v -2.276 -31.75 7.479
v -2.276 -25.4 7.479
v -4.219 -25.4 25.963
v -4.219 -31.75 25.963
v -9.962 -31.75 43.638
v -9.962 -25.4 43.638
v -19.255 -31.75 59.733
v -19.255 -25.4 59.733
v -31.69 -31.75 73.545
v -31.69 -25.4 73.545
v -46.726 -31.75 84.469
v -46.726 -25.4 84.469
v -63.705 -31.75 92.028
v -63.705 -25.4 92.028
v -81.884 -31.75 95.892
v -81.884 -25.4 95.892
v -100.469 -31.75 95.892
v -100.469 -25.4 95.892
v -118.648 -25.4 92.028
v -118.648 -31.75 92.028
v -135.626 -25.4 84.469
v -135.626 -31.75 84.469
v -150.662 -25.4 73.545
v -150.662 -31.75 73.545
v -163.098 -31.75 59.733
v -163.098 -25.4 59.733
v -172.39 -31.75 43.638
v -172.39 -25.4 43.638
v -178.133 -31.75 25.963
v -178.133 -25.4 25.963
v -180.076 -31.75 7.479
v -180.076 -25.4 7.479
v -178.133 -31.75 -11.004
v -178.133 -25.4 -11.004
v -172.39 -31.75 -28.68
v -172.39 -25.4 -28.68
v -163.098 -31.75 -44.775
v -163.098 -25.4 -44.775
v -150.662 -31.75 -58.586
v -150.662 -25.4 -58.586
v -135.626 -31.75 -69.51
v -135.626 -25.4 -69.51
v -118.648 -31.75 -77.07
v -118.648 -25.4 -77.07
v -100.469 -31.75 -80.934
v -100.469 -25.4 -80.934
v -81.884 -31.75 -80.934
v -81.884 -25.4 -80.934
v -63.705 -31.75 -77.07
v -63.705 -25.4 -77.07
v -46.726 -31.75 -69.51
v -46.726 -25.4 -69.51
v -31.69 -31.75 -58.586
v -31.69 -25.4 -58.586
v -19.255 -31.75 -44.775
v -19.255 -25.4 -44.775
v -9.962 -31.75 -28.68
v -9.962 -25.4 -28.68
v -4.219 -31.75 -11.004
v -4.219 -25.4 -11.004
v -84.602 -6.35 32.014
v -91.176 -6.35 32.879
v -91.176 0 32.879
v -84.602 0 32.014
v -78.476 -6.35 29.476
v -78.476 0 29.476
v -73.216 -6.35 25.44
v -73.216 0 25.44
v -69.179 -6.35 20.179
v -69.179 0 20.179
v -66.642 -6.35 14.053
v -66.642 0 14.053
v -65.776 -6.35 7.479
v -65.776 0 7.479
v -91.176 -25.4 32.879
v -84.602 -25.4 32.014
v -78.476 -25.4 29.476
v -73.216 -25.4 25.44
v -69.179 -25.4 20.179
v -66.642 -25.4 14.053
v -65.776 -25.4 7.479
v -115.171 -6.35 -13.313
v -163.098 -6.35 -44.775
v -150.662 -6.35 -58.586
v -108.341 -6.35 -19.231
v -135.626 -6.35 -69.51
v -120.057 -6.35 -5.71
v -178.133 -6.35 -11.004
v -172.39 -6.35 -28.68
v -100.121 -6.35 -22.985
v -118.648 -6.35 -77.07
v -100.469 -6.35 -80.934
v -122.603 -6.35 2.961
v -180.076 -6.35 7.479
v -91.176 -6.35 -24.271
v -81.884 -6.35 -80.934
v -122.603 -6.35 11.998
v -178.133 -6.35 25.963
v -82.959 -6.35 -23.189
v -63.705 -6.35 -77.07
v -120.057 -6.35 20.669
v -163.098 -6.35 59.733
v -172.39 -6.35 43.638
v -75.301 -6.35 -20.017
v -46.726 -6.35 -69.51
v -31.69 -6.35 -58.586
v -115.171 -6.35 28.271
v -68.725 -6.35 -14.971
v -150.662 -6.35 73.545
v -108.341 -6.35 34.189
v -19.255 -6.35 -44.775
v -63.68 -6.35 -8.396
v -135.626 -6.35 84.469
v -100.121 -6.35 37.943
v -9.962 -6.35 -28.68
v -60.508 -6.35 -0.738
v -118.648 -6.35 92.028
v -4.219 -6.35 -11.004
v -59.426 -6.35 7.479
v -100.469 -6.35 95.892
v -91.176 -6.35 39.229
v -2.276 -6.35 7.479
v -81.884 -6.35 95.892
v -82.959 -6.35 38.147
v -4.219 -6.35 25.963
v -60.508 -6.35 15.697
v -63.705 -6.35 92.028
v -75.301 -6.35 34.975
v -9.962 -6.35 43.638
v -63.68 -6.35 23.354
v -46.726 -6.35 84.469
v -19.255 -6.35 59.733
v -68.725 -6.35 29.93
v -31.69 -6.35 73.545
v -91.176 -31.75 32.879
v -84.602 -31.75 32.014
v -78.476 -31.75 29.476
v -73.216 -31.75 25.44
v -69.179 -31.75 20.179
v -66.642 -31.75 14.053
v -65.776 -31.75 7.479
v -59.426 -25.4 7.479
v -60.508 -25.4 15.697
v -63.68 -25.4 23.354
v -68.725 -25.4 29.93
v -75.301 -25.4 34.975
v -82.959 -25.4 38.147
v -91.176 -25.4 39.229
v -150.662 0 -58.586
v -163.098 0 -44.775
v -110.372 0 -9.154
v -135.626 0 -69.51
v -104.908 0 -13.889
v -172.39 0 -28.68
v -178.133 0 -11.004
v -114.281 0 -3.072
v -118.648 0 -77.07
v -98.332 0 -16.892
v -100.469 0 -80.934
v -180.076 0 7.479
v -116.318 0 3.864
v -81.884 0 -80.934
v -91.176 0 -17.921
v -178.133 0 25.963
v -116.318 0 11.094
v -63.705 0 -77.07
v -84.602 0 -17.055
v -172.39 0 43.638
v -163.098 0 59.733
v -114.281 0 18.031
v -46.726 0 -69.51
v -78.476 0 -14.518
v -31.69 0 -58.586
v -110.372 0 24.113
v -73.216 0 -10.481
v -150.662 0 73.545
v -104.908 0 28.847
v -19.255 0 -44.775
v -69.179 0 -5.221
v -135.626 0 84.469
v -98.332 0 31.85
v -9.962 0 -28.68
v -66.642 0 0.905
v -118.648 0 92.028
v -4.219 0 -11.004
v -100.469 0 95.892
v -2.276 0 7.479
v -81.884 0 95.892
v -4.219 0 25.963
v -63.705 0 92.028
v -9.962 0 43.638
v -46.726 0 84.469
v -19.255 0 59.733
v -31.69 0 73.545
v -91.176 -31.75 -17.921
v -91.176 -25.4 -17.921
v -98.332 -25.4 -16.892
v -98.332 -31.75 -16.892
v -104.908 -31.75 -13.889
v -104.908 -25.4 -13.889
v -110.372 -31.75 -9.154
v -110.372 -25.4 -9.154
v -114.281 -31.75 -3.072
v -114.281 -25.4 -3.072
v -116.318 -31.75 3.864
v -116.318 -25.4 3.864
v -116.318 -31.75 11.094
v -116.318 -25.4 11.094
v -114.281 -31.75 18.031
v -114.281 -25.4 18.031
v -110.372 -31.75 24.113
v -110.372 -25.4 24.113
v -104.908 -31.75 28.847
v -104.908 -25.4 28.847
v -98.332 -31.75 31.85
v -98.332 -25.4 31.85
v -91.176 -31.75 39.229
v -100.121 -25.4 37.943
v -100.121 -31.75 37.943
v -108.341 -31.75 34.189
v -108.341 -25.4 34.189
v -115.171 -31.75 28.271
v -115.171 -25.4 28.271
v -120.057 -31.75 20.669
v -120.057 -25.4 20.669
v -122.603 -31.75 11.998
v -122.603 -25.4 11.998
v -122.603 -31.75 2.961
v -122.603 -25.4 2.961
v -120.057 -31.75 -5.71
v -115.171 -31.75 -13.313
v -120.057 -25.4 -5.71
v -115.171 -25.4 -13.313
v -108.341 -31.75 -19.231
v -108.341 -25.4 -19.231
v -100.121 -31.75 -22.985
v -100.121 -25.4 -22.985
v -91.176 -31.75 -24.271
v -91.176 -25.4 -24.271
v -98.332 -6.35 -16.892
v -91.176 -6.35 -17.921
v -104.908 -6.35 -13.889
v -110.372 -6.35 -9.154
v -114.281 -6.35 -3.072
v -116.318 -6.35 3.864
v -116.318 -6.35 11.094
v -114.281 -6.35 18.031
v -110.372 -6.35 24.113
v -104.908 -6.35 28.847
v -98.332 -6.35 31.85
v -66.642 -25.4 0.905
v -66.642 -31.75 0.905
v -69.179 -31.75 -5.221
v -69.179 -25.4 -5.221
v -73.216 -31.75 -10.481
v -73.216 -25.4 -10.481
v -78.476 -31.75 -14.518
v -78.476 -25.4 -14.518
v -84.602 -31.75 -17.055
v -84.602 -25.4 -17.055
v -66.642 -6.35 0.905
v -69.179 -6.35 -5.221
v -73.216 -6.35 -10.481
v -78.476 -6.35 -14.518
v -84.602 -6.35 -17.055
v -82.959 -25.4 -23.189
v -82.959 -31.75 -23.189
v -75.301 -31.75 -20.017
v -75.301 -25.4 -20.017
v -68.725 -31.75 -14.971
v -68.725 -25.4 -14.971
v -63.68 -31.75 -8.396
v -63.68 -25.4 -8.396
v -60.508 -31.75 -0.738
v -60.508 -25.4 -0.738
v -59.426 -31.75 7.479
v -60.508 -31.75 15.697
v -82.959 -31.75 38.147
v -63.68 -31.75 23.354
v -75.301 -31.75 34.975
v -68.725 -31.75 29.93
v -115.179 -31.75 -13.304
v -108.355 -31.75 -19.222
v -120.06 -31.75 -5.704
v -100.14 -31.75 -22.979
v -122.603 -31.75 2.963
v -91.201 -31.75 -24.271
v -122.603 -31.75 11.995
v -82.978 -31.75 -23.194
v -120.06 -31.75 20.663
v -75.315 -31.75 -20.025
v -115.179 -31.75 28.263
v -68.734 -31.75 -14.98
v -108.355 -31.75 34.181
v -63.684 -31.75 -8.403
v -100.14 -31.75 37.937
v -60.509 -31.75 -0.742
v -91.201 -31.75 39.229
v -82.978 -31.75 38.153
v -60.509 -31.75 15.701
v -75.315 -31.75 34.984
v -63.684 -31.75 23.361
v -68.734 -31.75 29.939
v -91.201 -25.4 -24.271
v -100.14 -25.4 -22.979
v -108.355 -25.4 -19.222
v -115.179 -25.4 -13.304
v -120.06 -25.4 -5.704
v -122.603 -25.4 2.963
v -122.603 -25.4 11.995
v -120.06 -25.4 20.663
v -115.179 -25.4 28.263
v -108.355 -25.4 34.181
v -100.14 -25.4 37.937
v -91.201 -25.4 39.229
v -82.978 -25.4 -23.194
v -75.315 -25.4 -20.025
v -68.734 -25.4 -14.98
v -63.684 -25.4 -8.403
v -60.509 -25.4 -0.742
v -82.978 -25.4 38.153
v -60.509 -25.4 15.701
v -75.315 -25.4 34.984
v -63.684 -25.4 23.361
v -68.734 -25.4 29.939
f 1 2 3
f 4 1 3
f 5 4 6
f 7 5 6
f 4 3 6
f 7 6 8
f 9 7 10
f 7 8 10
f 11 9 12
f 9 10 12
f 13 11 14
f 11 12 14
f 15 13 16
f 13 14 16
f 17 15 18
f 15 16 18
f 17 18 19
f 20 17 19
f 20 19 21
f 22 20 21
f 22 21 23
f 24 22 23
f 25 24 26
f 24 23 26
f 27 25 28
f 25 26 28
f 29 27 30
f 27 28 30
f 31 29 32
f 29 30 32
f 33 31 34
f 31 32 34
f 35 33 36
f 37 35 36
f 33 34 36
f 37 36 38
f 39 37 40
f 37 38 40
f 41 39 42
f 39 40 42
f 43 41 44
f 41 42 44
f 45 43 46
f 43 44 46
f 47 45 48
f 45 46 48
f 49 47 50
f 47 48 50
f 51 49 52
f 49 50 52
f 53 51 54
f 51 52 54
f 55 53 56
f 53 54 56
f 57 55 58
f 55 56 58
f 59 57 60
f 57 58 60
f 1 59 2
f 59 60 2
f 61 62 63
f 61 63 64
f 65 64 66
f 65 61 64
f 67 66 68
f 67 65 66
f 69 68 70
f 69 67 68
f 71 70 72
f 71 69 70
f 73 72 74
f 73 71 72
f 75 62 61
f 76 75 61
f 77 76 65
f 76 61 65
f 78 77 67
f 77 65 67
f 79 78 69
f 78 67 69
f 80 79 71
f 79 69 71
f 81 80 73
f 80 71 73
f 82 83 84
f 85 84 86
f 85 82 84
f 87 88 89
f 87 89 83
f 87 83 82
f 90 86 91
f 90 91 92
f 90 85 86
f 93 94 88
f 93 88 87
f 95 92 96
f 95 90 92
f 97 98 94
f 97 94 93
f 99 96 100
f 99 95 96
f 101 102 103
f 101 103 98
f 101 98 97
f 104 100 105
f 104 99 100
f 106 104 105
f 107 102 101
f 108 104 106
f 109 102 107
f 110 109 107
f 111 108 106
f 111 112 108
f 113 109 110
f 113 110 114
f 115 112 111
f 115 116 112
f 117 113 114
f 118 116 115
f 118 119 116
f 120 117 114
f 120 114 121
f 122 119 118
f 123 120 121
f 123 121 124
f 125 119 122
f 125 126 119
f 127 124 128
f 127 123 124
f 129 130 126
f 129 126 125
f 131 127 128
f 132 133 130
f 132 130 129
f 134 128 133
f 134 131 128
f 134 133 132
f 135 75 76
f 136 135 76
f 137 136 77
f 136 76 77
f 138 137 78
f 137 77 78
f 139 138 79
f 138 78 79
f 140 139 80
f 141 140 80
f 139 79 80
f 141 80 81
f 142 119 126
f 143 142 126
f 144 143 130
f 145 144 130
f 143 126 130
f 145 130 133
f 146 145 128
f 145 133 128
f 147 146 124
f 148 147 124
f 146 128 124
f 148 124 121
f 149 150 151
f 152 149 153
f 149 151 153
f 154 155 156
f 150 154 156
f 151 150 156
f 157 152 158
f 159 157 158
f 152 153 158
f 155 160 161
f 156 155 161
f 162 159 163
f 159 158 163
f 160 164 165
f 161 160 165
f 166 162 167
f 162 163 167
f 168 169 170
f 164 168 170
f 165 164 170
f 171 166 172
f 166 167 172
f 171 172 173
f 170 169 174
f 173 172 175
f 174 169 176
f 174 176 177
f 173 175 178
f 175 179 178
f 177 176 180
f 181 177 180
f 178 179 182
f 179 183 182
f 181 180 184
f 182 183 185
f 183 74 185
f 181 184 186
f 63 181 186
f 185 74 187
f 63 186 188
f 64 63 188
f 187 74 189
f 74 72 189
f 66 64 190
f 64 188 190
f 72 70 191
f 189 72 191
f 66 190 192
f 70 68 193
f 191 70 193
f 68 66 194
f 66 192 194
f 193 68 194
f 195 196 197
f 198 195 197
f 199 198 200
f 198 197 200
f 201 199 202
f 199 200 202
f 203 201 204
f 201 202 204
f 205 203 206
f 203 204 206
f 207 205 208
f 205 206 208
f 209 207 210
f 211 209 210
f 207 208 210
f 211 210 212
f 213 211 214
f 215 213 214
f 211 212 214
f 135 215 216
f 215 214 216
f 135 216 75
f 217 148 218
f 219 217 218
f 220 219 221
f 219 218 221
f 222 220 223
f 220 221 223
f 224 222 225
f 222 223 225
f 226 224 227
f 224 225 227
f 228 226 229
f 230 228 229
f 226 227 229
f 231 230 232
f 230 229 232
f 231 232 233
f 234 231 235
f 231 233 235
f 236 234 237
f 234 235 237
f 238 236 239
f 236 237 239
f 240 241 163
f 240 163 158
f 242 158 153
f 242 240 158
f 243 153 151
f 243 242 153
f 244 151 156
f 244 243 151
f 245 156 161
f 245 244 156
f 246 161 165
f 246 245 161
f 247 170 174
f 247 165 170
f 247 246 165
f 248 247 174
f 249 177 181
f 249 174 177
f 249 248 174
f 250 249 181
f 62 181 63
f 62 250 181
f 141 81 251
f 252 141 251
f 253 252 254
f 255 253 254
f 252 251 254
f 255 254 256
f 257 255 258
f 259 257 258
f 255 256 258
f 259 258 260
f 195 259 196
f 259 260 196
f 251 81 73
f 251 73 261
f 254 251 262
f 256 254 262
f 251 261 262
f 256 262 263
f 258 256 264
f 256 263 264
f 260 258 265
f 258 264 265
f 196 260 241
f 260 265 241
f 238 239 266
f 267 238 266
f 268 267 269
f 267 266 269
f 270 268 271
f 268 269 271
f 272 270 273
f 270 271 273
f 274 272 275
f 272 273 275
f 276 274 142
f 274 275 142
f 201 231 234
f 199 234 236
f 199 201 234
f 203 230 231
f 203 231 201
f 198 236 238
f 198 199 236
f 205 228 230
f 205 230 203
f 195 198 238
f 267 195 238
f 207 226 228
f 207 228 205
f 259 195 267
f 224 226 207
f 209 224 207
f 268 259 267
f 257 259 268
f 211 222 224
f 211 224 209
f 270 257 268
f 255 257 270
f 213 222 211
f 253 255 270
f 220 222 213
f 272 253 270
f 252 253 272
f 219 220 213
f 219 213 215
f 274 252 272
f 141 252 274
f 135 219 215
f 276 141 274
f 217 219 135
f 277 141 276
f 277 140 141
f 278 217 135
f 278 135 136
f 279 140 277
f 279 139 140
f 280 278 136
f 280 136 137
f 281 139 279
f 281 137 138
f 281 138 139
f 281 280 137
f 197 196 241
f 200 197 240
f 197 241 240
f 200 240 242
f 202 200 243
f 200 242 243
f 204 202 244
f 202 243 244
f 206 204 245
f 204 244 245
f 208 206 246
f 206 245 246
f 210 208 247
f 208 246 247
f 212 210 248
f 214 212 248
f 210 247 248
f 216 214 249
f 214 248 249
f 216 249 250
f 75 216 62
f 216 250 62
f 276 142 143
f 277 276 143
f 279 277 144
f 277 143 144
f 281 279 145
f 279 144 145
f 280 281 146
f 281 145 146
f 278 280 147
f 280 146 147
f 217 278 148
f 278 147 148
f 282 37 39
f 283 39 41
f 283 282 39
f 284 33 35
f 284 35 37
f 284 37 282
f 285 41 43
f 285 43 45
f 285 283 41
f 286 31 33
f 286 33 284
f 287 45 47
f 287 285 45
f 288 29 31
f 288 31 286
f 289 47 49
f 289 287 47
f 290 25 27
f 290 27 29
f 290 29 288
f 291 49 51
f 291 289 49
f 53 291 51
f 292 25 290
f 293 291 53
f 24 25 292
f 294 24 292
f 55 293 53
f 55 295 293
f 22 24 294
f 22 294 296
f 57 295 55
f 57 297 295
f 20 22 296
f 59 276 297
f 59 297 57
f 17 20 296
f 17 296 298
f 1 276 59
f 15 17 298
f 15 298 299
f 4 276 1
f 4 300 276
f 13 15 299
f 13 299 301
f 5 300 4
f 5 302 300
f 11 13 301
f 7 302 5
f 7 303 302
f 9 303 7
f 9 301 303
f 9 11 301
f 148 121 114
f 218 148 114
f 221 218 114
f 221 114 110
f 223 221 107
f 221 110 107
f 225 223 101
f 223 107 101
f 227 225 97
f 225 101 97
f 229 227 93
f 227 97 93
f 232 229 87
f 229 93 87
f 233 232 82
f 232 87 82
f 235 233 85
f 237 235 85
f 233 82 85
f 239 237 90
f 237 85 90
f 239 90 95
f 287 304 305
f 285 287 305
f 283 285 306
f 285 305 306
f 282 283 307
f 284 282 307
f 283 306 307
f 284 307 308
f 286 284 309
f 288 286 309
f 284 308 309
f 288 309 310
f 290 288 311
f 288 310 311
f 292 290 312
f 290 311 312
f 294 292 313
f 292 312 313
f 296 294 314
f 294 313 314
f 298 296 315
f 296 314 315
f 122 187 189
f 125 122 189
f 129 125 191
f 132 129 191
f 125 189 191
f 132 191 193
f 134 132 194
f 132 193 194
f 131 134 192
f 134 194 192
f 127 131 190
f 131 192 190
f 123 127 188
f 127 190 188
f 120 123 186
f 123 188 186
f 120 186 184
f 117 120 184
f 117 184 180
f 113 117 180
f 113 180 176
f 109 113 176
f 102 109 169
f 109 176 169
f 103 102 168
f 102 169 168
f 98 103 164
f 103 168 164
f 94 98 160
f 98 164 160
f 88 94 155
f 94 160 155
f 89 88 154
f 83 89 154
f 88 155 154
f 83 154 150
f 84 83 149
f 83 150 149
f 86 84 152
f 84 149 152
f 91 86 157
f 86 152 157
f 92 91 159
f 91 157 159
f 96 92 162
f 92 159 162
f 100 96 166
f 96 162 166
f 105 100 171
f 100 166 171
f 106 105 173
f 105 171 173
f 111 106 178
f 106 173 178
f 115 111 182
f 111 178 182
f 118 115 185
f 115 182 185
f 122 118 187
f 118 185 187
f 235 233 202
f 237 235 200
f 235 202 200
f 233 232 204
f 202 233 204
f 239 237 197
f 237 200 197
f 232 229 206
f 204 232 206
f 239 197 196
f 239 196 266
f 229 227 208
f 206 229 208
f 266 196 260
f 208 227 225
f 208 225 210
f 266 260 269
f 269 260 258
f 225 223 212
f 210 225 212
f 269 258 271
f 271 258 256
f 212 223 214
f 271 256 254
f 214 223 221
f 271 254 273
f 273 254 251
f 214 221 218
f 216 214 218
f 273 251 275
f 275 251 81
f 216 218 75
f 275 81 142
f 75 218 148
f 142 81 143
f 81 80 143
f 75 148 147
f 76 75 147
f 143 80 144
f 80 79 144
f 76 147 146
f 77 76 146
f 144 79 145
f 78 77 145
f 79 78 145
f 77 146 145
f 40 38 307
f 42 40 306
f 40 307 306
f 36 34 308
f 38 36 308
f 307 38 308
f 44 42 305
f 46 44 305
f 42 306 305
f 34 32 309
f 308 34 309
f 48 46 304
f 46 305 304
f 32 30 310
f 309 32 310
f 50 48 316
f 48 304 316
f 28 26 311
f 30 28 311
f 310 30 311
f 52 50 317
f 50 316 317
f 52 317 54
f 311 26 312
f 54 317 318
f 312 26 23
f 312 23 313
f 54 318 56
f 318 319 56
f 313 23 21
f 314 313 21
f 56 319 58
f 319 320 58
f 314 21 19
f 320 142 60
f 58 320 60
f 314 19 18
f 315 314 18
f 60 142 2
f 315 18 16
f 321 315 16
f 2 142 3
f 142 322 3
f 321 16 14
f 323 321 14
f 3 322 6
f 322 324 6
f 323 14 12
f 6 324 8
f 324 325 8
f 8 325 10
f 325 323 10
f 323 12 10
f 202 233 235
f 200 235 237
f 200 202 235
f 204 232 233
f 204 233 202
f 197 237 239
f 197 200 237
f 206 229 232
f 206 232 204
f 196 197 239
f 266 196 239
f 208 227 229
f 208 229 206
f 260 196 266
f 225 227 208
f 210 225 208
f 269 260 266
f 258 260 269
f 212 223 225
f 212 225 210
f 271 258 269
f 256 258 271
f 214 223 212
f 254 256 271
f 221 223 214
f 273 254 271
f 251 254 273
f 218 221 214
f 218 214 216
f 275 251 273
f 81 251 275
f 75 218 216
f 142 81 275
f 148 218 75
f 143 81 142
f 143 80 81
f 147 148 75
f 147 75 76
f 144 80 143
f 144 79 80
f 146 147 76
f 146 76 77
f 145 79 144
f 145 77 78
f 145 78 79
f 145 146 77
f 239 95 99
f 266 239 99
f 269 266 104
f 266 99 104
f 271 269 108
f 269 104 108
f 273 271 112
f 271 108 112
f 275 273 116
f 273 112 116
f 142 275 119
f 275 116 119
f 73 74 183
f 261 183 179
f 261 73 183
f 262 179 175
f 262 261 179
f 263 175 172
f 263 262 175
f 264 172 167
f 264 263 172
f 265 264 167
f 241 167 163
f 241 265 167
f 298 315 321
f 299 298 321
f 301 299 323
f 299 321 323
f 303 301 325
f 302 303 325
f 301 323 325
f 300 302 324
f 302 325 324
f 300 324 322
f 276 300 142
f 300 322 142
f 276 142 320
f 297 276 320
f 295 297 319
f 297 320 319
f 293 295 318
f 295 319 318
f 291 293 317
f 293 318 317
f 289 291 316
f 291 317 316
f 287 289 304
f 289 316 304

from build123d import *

# Parameters (mm, degrees)
F0_R     = 88.9
F1_DEPTH = 6.35
F3_DEPTH = 19.05
F4_R     = 88.9
F5_DEPTH = 6.35
F6_DEPTH = 6.35
F7_DEPTH = 25.4


with BuildPart() as f1:
    # F0 (on Front) → F1 (new body)
    with BuildSketch(Plane.XZ):
        with Locations((-91.1761373281, 7.4791824445)):
            Circle(F0_R)
    extrude(amount=F1_DEPTH)

    # F2 (on face) → F3 (join)
    with BuildSketch(Plane.XZ.offset(6.35)):
        with BuildLine():
            Line((-91.1761373281, 32.8791824445), (-91.1761373281, 39.2291824445))
            ThreePointArc((-91.1761373281, 39.2291824445), (-122.9261373281, 7.4791824445), (-91.1761373281, -24.2708175555))
            Line((-91.1761373281, -24.2708175555), (-91.1761373281, -17.9208175555))
            ThreePointArc((-91.1761373281, -17.9208175555), (-116.5761373281, 7.4791824445), (-91.1761373281, 32.8791824445))
        make_face()
        with BuildLine():
            ThreePointArc((-59.4261373281, 7.4791824445), (-68.7254970255, 29.9298227472), (-91.1761373281, 39.2291824445))
            Line((-91.1761373281, 39.2291824445), (-91.1761373281, 32.8791824445))
            ThreePointArc((-91.1761373281, 32.8791824445), (-73.215625086, 25.4396946867), (-65.7761373281, 7.4791824445))
            ThreePointArc((-65.7761373281, 7.4791824445), (-73.215625086, -10.4813297976), (-91.1761373281, -17.9208175555))
            Line((-91.1761373281, -17.9208175555), (-91.1761373281, -24.2708175555))
            ThreePointArc((-91.1761373281, -24.2708175555), (-68.7254970255, -14.9714578582), (-59.4261373281, 7.4791824445))
        make_face()
    extrude(amount=F3_DEPTH)


with BuildPart() as f5:
    # F4 (on face) → F5 (new body)
    with BuildSketch(Plane.XZ.offset(25.4)):
        with Locations((-91.1761373281, 7.4791824445)):
            Circle(F4_R)
        with BuildLine():
            ThreePointArc((-91.2007505714, -24.2708080151), (-122.9261373281, 7.4791824445), (-91.2007505714, 39.2291729042))
            ThreePointArc((-91.2007505714, 39.2291729042), (-68.7342008083, 29.9385231569), (-59.4261373281, 7.4791824445))
            ThreePointArc((-59.4261373281, 7.4791824445), (-68.7342008083, -14.9801582679), (-91.2007505714, -24.2708080151))
        make_face(mode=Mode.SUBTRACT)
    extrude(amount=F5_DEPTH)


with BuildPart() as f6:
    # F6 (new): a face of the model
    f6_faces = [f1.part.faces().sort_by_distance(p)[0] for p in [
        (-91.1761373281, -25.4, 38.3311568324),
    ]]
    extrude(f6_faces, amount=F6_DEPTH)


with BuildPart() as f1_1:
    add(f1.part)

    # F7 (cut): a face of the model
    f7_faces = [f1_1.faces().sort_by_distance(p)[0] for p in [
        (-91.1761373281, -6.35, 7.4791824445),
    ]]
    extrude(f7_faces, amount=-F7_DEPTH, mode=Mode.SUBTRACT)


solid = Compound([f5.part, f6.part, f1_1.part])
